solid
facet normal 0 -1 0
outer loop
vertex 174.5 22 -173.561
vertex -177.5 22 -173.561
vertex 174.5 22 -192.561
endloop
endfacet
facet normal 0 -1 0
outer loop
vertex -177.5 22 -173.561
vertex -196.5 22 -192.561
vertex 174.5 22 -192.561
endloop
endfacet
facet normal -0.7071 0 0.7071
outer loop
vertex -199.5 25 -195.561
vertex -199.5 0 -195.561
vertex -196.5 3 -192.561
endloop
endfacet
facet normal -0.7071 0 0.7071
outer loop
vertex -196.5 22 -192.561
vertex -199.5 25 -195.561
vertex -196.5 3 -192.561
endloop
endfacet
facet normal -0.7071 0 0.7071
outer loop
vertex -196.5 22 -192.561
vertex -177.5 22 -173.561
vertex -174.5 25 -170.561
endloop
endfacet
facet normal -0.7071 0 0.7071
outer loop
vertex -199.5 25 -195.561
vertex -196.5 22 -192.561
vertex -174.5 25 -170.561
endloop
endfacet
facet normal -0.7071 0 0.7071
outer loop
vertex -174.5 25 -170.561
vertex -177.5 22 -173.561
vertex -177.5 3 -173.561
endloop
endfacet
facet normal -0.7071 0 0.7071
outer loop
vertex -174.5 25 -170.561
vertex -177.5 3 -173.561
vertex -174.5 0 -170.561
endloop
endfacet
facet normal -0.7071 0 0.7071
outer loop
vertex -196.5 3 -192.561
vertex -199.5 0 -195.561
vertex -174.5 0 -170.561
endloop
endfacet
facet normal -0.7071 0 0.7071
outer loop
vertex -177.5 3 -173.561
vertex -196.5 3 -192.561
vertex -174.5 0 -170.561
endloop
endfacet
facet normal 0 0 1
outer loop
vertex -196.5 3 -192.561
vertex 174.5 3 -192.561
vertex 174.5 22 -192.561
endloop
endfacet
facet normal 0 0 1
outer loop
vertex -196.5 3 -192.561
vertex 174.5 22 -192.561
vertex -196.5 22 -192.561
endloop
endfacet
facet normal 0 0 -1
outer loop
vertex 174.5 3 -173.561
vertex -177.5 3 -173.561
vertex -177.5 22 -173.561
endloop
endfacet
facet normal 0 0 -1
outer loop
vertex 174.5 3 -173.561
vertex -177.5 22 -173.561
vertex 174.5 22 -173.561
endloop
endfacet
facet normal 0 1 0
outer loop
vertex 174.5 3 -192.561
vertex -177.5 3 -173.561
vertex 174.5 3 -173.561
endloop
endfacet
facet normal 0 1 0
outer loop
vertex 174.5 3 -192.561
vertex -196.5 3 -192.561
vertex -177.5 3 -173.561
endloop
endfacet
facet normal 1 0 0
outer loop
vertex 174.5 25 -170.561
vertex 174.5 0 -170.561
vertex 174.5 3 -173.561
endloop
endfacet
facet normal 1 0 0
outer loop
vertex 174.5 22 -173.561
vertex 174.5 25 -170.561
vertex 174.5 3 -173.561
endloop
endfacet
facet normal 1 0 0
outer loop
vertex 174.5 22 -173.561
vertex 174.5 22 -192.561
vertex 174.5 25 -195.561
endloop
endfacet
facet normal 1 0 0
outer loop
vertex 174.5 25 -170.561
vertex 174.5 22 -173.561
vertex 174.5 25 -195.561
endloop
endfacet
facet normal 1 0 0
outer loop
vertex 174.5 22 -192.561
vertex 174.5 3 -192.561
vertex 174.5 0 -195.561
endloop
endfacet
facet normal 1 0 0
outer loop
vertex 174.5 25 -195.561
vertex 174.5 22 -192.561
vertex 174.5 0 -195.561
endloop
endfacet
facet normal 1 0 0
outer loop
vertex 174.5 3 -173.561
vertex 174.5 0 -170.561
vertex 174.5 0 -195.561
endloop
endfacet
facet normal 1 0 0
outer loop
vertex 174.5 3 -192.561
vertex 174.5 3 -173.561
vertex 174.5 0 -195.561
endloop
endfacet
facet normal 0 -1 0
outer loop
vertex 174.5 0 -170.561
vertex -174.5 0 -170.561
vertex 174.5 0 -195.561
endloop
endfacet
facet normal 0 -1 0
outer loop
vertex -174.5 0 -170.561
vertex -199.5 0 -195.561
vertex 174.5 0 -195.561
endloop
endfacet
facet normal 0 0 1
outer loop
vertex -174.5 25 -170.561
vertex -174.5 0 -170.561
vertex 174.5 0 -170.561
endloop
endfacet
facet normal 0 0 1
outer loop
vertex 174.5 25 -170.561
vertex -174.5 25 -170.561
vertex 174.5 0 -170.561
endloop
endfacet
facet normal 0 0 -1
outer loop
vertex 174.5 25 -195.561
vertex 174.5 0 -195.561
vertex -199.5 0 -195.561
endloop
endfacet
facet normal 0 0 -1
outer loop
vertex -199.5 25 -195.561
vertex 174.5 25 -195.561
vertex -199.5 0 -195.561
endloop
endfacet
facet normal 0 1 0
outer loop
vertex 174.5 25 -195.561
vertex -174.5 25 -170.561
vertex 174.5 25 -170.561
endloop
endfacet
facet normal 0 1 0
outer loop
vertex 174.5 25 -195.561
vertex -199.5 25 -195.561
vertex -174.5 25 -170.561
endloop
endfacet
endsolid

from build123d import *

# Parameters (mm, degrees)
BOSS_EXTRUDE1_DEPTH = 25
SHELL1_T            = -3


with BuildPart() as part:
    # Sketch1 → Boss-Extrude1 (new body)
    with BuildSketch(Plane(origin=(0, 0, 0), x_dir=(1, 0, 0), z_dir=(0, 1, 0))):
        Polygon((-174.5, 170.560948081), (174.5, 170.560948081), (174.5, 195.560948081), (-199.5, 195.560948081), align=None)
    extrude(amount=BOSS_EXTRUDE1_DEPTH)

    # Shell1
    shell1_openings = [part.faces().sort_by_distance(p)[0] for p in [
        (174.5, 12.5, -183.060948081),
        (-187, 12.5, -183.060948081),
    ]]
    offset(amount=SHELL1_T, openings=shell1_openings, kind=Kind.INTERSECTION)


solid = part.part
